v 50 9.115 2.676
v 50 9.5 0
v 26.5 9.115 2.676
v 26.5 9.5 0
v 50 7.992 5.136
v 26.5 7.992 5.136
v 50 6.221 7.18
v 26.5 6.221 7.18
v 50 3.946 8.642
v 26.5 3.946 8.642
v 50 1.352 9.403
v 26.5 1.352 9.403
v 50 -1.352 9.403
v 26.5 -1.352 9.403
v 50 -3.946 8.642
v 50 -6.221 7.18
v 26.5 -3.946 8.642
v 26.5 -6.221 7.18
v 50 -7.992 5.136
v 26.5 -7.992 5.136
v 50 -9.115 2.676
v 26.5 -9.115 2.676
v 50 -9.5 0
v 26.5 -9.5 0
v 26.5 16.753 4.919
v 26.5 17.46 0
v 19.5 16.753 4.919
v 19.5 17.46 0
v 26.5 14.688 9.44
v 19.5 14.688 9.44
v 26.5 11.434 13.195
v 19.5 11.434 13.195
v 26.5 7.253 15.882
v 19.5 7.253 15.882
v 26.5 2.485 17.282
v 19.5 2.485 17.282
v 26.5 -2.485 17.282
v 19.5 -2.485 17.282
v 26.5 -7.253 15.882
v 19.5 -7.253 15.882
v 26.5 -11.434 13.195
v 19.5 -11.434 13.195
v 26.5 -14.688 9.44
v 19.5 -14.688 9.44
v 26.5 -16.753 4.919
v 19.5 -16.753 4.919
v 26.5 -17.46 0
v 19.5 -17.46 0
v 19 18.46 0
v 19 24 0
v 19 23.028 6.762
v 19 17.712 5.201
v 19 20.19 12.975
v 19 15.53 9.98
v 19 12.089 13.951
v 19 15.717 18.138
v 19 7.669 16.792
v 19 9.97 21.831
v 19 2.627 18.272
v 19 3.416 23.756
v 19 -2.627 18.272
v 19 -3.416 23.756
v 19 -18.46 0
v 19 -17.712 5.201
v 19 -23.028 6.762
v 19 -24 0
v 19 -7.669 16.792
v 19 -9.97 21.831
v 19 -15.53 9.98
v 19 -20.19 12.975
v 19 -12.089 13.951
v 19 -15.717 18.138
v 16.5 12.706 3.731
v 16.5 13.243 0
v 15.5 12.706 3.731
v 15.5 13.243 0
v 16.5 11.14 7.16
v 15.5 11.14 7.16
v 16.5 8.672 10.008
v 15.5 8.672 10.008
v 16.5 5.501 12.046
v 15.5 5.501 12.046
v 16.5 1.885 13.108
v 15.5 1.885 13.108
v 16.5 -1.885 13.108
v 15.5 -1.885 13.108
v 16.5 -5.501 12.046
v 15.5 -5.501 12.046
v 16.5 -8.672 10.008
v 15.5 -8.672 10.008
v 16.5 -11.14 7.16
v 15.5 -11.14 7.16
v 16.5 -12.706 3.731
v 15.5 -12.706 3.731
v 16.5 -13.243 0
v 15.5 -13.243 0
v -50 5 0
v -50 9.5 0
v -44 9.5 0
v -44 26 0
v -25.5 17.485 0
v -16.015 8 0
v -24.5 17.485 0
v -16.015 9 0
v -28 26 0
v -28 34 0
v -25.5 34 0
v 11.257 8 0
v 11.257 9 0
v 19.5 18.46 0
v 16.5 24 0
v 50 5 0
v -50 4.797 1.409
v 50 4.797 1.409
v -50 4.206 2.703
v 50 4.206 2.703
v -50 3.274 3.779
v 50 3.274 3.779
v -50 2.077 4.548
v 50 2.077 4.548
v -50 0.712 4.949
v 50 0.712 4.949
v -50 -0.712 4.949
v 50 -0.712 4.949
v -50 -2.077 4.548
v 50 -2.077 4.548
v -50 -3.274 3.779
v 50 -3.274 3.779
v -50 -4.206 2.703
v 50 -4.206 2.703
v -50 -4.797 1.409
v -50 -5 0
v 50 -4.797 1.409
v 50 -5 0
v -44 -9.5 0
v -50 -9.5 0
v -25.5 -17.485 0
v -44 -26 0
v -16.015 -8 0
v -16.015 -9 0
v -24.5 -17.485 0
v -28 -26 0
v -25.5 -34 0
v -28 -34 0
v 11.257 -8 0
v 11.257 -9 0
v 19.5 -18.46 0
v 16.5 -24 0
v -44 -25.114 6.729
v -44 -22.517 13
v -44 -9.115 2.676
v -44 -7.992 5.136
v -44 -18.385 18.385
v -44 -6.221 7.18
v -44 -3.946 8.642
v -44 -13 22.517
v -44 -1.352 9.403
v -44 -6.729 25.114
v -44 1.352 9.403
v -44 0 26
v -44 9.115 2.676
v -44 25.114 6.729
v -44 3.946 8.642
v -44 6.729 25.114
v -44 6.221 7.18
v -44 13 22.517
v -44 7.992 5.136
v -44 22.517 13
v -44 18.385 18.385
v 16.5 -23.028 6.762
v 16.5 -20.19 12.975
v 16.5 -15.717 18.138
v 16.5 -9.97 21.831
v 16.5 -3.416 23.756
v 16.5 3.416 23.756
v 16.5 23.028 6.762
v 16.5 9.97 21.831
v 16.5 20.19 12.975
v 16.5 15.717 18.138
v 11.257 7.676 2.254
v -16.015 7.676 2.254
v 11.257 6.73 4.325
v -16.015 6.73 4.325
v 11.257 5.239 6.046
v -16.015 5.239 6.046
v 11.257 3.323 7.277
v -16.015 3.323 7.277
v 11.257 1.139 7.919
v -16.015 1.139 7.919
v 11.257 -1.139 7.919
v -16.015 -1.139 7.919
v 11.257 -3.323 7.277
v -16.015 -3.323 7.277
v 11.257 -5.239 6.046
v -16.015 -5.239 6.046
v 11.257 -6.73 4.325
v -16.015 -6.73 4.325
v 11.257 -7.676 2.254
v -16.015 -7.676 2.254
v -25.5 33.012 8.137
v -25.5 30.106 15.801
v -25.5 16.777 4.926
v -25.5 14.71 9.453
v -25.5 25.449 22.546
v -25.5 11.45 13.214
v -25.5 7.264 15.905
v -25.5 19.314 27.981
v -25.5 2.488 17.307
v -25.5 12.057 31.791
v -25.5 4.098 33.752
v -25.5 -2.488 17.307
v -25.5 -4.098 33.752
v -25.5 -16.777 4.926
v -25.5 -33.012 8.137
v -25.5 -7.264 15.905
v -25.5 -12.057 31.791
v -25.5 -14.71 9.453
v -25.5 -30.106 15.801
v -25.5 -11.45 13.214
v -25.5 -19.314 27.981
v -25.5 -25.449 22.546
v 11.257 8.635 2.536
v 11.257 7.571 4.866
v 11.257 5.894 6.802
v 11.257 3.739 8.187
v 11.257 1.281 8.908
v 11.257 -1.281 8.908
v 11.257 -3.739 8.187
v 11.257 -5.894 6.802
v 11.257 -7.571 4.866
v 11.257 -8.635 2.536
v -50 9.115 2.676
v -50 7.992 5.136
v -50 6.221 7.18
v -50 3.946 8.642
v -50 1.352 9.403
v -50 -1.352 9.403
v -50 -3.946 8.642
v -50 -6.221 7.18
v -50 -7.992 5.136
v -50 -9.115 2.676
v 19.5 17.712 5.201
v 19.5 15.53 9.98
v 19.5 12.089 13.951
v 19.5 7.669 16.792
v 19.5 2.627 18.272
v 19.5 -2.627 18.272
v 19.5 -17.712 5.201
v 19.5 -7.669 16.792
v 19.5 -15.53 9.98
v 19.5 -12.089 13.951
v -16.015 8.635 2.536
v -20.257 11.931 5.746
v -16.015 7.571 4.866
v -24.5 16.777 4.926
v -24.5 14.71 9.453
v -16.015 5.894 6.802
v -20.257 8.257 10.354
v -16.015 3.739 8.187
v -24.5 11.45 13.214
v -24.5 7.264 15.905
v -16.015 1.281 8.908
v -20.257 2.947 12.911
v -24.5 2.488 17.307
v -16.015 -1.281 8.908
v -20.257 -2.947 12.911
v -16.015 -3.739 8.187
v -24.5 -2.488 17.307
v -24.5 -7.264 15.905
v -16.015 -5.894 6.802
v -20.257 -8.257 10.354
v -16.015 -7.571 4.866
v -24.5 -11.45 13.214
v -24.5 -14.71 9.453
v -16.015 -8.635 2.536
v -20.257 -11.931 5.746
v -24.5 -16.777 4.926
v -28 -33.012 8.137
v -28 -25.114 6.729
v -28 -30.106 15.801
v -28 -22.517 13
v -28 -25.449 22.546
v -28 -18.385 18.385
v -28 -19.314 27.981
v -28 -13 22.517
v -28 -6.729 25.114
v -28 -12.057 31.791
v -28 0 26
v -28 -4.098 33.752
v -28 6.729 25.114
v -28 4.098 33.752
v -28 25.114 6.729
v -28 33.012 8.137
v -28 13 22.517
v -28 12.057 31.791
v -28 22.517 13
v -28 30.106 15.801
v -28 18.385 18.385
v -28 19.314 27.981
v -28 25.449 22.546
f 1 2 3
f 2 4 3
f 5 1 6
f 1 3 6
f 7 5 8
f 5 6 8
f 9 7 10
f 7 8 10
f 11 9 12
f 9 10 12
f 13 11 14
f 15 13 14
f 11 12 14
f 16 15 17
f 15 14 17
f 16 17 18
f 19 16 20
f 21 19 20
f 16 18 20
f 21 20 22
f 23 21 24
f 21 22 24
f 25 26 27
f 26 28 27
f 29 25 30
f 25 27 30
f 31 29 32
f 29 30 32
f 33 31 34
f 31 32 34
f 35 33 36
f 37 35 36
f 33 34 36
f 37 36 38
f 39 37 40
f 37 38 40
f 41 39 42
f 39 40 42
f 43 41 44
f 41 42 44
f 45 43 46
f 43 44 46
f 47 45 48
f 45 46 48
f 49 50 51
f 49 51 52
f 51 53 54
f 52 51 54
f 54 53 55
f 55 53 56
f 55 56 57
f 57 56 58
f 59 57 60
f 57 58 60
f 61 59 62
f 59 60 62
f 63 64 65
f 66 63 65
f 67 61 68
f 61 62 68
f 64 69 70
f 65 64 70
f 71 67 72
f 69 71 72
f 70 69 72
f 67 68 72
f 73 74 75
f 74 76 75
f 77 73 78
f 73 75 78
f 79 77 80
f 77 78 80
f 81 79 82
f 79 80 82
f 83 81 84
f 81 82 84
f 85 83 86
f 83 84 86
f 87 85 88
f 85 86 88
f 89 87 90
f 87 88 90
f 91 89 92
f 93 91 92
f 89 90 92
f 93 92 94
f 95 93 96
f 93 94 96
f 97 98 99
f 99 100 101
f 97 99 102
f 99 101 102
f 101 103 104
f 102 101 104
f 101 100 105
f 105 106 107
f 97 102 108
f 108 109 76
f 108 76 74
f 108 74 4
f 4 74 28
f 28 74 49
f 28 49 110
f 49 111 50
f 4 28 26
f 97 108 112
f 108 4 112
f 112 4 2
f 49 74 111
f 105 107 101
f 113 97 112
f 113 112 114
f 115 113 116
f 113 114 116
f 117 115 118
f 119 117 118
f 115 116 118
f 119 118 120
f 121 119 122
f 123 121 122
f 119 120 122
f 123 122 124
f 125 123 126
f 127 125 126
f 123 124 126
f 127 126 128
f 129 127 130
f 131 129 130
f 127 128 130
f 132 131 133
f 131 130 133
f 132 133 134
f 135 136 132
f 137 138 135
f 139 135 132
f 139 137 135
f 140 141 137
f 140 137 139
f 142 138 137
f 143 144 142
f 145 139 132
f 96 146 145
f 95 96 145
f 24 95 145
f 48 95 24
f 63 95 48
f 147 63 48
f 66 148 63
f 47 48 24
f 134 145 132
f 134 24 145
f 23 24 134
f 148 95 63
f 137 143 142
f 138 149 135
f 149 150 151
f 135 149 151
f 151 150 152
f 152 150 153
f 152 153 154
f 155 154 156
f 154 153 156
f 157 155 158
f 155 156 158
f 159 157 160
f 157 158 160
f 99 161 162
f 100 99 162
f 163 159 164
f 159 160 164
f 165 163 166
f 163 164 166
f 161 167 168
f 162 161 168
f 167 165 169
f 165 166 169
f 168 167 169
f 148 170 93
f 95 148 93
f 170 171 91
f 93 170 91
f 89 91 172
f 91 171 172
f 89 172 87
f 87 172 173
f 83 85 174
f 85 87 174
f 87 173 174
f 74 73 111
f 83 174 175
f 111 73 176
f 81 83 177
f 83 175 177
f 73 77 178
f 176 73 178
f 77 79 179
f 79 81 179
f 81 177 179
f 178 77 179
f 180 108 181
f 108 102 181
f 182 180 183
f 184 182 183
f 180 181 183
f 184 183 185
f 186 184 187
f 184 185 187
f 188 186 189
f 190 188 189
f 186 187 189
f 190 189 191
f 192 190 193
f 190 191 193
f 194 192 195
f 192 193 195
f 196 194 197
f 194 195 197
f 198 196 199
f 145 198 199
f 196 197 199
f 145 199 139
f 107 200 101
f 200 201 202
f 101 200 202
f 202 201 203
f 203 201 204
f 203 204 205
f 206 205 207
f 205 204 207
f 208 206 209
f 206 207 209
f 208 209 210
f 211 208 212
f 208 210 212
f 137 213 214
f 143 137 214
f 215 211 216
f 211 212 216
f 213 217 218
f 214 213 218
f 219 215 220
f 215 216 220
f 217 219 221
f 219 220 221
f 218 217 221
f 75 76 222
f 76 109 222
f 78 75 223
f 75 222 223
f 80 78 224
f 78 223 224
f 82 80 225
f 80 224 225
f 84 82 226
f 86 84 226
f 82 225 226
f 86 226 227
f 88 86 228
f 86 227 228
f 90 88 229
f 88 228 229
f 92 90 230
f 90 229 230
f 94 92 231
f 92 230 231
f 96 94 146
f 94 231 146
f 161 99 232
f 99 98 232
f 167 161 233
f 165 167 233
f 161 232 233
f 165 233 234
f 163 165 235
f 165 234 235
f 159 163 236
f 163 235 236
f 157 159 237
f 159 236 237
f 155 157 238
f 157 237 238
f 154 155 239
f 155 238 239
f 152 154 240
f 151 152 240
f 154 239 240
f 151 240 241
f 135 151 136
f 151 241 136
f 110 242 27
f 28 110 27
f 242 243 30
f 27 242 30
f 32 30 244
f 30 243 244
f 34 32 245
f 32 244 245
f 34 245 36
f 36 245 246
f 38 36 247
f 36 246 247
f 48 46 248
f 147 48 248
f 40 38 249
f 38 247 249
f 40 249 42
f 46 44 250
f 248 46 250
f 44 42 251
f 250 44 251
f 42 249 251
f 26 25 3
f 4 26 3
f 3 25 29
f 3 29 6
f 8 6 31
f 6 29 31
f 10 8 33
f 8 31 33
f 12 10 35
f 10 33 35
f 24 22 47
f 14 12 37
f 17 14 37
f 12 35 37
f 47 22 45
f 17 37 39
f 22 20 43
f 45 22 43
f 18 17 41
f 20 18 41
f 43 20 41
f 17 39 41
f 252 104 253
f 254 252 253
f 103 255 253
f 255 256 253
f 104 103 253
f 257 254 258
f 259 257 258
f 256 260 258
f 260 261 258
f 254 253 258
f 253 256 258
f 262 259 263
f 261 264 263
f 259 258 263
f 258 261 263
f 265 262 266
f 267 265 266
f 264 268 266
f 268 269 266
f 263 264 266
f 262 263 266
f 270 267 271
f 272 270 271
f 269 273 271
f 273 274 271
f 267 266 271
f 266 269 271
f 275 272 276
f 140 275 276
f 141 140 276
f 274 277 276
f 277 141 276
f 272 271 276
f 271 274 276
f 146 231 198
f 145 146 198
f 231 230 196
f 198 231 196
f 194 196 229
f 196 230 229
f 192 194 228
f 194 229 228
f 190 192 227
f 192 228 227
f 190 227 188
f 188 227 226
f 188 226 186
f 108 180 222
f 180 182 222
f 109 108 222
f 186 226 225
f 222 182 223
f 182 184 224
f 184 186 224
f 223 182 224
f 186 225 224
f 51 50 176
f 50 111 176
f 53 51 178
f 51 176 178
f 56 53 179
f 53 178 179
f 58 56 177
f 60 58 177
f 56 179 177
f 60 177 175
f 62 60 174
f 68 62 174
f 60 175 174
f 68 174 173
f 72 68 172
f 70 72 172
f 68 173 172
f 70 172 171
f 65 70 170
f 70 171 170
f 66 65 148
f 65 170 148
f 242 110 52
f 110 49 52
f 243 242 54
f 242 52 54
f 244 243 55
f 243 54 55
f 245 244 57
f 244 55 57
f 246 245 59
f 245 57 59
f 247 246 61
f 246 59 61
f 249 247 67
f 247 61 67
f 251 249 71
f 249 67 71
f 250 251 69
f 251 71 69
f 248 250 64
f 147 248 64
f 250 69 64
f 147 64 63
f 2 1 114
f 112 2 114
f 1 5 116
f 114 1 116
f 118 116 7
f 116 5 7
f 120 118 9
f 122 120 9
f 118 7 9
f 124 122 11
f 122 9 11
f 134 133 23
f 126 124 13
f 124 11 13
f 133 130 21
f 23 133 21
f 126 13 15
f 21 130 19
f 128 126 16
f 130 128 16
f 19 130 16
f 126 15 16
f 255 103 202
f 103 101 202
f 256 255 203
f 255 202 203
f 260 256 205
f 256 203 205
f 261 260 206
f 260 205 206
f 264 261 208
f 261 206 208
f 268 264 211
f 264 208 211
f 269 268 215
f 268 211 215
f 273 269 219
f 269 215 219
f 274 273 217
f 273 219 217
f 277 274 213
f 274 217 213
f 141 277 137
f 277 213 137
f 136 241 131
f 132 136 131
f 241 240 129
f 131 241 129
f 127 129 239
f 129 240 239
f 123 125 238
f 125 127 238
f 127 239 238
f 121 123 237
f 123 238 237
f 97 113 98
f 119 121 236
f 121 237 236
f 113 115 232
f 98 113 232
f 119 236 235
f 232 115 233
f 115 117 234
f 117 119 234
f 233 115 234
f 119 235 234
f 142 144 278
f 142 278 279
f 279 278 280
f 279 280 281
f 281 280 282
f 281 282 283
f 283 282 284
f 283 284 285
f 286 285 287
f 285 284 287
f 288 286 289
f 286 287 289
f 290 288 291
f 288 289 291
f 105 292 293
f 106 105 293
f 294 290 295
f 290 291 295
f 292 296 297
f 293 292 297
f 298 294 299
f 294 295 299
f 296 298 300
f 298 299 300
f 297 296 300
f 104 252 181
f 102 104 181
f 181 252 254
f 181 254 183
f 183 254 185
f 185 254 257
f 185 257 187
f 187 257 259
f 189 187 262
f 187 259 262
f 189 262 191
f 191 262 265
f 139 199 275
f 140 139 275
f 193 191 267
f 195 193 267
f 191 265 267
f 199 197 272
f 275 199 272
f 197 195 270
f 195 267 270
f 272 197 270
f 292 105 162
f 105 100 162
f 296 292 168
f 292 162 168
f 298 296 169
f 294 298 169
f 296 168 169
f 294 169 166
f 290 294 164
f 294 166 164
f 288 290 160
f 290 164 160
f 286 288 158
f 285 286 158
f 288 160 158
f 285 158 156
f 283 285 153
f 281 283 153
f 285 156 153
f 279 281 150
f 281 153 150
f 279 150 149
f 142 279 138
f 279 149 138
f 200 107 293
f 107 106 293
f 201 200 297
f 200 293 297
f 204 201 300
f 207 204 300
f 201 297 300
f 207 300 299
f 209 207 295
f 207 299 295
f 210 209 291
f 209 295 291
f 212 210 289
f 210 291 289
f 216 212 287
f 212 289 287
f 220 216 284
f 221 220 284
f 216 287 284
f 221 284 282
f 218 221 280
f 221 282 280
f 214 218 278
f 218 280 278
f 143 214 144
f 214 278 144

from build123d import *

# Parameters (mm, degrees)
REVOLUTION_ANGLE = 180


with BuildPart() as part:
    # Sketch → Revolution (revolve)
    with BuildSketch(Plane.XY):
        Polygon((26.5, 9.5), (26.5, 17.46), (19.5, 17.46), (19.5, 18.46), (19, 18.46), (19, 24), (16.5, 24), (16.5, 13.242641), (15.5, 13.242641), (11.257359, 9), (11.257359, 8), (-16.014719, 8), (-16.014719, 9), (-24.5, 17.485281), (-25.5, 17.485281), (-25.5, 34), (-28, 34), (-28, 26), (-44, 26), (-44, 9.5), (-50, 9.5), (-50, 5), (50, 5), (50, 9.5), align=None)
    revolve(axis=Axis((0, 0, 0), (1, 0, 0)), revolution_arc=REVOLUTION_ANGLE)


solid = part.part
